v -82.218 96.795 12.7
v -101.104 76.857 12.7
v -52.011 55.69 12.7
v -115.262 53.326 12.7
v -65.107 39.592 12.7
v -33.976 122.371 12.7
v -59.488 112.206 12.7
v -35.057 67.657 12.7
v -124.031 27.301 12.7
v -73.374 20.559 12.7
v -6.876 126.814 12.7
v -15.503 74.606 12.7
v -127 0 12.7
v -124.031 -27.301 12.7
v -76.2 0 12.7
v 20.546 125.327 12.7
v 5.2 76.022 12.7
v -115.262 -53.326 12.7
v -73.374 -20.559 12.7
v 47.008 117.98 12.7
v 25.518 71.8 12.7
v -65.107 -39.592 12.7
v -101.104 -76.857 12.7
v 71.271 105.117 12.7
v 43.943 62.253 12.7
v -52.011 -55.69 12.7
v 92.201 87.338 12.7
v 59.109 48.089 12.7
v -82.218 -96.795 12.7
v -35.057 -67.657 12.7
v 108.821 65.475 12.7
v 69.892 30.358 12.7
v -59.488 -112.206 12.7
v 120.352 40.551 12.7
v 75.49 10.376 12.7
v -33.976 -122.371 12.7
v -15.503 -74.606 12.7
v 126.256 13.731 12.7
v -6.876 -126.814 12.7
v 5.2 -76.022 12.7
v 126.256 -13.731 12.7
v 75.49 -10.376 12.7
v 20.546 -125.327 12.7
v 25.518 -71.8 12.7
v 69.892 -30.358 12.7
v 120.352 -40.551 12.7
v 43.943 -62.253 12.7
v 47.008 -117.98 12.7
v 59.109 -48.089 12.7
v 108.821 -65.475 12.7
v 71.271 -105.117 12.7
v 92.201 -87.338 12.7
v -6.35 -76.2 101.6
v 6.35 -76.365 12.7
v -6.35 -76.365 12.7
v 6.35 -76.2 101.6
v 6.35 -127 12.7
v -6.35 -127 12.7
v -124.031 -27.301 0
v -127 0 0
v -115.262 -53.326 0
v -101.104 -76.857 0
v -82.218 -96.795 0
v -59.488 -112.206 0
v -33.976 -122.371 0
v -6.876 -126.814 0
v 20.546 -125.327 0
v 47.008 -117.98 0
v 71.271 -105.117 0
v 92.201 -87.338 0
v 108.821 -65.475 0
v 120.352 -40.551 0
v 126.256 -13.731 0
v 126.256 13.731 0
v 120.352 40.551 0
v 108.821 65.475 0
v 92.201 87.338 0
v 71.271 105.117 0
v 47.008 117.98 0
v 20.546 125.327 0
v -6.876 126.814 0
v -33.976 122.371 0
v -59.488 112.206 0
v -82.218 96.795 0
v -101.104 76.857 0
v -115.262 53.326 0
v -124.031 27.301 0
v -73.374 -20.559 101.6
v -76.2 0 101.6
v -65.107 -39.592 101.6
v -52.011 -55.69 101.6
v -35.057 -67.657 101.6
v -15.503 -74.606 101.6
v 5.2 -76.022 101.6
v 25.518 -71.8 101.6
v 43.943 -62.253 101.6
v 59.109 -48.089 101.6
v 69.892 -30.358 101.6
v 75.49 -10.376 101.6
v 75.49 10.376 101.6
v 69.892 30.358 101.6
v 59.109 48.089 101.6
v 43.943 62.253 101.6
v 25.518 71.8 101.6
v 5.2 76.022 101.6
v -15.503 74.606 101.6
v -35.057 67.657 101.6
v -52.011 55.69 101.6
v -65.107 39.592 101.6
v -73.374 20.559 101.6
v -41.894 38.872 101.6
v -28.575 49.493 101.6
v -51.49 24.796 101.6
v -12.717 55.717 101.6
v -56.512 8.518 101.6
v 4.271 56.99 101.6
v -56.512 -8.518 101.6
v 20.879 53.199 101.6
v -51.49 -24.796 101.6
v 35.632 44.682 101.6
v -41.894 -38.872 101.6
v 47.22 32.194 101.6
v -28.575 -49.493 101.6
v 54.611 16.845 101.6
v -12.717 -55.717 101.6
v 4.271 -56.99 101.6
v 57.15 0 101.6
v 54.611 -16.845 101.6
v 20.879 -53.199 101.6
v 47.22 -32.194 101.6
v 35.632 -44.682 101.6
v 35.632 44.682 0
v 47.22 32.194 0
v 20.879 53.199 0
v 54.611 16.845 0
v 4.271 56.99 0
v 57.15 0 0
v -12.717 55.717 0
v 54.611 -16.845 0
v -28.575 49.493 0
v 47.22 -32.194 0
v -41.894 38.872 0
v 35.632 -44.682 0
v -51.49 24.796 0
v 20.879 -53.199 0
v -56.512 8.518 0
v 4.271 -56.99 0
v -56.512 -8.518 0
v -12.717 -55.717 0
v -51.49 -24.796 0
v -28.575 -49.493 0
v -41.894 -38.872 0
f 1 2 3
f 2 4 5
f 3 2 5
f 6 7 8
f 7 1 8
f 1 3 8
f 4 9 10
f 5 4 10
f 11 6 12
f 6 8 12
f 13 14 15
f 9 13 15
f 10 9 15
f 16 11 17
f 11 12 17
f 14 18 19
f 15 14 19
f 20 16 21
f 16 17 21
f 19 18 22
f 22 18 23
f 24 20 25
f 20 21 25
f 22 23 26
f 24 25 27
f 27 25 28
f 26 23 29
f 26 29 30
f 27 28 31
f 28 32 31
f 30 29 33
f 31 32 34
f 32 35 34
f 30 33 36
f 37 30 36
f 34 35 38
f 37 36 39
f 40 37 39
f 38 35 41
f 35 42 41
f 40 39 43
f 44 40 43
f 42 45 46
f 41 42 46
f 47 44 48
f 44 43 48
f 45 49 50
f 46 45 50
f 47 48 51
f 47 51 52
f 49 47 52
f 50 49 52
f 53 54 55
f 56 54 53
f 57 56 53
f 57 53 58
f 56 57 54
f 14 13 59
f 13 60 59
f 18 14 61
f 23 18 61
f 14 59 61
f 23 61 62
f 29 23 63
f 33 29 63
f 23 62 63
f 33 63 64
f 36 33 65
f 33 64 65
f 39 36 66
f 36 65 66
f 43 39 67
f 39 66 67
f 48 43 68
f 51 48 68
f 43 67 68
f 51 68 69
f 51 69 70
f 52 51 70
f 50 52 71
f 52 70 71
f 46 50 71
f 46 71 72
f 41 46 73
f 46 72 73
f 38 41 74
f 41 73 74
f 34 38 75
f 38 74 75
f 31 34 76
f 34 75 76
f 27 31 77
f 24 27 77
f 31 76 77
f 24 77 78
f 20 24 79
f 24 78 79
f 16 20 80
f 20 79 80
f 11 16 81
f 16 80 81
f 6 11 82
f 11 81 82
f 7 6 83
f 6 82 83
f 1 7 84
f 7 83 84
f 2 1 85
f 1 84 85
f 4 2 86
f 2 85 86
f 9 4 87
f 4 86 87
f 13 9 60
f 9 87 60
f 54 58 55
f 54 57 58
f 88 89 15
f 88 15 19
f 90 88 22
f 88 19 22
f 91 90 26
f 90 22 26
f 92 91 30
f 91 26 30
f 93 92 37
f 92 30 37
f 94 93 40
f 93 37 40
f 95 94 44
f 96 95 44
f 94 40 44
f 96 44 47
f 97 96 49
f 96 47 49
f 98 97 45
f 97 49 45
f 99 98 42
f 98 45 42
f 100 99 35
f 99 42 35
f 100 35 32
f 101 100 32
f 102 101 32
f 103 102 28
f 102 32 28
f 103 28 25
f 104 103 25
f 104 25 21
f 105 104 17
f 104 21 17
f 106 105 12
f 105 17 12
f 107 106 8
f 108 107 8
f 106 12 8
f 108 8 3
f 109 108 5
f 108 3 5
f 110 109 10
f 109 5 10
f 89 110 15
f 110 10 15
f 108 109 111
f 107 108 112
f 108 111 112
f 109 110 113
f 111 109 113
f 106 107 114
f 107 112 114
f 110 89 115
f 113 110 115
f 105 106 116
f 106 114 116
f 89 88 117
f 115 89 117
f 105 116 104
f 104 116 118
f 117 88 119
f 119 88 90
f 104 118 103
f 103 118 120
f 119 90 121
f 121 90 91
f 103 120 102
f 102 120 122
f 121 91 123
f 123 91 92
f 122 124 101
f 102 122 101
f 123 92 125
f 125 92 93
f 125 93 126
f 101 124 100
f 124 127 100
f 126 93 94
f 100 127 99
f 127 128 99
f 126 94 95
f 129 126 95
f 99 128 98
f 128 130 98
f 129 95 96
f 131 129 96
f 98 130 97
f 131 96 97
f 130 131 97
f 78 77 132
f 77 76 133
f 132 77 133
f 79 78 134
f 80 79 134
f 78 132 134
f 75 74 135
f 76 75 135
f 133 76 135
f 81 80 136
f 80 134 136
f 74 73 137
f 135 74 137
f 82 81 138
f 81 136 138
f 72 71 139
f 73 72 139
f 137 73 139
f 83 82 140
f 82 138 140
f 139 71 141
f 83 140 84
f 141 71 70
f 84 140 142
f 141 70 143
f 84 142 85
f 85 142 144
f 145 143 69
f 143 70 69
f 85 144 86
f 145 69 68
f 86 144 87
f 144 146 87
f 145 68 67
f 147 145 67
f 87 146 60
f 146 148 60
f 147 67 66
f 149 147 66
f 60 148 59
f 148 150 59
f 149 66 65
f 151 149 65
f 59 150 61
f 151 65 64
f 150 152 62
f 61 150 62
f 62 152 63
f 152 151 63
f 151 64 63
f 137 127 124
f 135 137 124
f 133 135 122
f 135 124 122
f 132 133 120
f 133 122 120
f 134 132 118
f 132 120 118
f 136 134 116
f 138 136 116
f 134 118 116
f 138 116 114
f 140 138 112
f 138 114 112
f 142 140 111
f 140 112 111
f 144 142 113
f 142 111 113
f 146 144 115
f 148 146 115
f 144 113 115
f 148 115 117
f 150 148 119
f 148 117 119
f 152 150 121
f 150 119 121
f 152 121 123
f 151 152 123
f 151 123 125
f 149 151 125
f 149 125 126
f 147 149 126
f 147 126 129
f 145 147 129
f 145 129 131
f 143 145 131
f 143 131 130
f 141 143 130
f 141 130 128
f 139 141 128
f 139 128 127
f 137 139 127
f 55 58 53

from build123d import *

# Parameters (mm, degrees)
F3_R     = 57.15
F4_DEPTH = 101.601
F6_DEPTH = 6.35


with BuildPart() as f2:
    # F0 (on Front) → F2 (revolve)
    with BuildSketch(Plane.XZ):
        Polygon((-127, 0), (0, 0), (0, 101.6), (-76.2, 101.6), (-76.2, 12.7), (-127, 12.7), align=None)
    revolve(axis=Axis((0, 0, 14.6887078881), (0, 0, 1)))

    # F3 (on face) → F4 (cut, through all)
    with BuildSketch(Plane.XY.offset(101.6)):
        Circle(F3_R)
    extrude(amount=-F4_DEPTH, mode=Mode.SUBTRACT)


with BuildPart() as f6:
    # F5 (on Right) → F6 (new body, symmetric)
    with BuildSketch(Plane.YZ):
        Polygon((-76.3652846217, 12.7), (-76.2, 101.6), (-127, 12.7), align=None)
    extrude(amount=F6_DEPTH, both=True)


solid = Compound([f2.part, f6.part])
